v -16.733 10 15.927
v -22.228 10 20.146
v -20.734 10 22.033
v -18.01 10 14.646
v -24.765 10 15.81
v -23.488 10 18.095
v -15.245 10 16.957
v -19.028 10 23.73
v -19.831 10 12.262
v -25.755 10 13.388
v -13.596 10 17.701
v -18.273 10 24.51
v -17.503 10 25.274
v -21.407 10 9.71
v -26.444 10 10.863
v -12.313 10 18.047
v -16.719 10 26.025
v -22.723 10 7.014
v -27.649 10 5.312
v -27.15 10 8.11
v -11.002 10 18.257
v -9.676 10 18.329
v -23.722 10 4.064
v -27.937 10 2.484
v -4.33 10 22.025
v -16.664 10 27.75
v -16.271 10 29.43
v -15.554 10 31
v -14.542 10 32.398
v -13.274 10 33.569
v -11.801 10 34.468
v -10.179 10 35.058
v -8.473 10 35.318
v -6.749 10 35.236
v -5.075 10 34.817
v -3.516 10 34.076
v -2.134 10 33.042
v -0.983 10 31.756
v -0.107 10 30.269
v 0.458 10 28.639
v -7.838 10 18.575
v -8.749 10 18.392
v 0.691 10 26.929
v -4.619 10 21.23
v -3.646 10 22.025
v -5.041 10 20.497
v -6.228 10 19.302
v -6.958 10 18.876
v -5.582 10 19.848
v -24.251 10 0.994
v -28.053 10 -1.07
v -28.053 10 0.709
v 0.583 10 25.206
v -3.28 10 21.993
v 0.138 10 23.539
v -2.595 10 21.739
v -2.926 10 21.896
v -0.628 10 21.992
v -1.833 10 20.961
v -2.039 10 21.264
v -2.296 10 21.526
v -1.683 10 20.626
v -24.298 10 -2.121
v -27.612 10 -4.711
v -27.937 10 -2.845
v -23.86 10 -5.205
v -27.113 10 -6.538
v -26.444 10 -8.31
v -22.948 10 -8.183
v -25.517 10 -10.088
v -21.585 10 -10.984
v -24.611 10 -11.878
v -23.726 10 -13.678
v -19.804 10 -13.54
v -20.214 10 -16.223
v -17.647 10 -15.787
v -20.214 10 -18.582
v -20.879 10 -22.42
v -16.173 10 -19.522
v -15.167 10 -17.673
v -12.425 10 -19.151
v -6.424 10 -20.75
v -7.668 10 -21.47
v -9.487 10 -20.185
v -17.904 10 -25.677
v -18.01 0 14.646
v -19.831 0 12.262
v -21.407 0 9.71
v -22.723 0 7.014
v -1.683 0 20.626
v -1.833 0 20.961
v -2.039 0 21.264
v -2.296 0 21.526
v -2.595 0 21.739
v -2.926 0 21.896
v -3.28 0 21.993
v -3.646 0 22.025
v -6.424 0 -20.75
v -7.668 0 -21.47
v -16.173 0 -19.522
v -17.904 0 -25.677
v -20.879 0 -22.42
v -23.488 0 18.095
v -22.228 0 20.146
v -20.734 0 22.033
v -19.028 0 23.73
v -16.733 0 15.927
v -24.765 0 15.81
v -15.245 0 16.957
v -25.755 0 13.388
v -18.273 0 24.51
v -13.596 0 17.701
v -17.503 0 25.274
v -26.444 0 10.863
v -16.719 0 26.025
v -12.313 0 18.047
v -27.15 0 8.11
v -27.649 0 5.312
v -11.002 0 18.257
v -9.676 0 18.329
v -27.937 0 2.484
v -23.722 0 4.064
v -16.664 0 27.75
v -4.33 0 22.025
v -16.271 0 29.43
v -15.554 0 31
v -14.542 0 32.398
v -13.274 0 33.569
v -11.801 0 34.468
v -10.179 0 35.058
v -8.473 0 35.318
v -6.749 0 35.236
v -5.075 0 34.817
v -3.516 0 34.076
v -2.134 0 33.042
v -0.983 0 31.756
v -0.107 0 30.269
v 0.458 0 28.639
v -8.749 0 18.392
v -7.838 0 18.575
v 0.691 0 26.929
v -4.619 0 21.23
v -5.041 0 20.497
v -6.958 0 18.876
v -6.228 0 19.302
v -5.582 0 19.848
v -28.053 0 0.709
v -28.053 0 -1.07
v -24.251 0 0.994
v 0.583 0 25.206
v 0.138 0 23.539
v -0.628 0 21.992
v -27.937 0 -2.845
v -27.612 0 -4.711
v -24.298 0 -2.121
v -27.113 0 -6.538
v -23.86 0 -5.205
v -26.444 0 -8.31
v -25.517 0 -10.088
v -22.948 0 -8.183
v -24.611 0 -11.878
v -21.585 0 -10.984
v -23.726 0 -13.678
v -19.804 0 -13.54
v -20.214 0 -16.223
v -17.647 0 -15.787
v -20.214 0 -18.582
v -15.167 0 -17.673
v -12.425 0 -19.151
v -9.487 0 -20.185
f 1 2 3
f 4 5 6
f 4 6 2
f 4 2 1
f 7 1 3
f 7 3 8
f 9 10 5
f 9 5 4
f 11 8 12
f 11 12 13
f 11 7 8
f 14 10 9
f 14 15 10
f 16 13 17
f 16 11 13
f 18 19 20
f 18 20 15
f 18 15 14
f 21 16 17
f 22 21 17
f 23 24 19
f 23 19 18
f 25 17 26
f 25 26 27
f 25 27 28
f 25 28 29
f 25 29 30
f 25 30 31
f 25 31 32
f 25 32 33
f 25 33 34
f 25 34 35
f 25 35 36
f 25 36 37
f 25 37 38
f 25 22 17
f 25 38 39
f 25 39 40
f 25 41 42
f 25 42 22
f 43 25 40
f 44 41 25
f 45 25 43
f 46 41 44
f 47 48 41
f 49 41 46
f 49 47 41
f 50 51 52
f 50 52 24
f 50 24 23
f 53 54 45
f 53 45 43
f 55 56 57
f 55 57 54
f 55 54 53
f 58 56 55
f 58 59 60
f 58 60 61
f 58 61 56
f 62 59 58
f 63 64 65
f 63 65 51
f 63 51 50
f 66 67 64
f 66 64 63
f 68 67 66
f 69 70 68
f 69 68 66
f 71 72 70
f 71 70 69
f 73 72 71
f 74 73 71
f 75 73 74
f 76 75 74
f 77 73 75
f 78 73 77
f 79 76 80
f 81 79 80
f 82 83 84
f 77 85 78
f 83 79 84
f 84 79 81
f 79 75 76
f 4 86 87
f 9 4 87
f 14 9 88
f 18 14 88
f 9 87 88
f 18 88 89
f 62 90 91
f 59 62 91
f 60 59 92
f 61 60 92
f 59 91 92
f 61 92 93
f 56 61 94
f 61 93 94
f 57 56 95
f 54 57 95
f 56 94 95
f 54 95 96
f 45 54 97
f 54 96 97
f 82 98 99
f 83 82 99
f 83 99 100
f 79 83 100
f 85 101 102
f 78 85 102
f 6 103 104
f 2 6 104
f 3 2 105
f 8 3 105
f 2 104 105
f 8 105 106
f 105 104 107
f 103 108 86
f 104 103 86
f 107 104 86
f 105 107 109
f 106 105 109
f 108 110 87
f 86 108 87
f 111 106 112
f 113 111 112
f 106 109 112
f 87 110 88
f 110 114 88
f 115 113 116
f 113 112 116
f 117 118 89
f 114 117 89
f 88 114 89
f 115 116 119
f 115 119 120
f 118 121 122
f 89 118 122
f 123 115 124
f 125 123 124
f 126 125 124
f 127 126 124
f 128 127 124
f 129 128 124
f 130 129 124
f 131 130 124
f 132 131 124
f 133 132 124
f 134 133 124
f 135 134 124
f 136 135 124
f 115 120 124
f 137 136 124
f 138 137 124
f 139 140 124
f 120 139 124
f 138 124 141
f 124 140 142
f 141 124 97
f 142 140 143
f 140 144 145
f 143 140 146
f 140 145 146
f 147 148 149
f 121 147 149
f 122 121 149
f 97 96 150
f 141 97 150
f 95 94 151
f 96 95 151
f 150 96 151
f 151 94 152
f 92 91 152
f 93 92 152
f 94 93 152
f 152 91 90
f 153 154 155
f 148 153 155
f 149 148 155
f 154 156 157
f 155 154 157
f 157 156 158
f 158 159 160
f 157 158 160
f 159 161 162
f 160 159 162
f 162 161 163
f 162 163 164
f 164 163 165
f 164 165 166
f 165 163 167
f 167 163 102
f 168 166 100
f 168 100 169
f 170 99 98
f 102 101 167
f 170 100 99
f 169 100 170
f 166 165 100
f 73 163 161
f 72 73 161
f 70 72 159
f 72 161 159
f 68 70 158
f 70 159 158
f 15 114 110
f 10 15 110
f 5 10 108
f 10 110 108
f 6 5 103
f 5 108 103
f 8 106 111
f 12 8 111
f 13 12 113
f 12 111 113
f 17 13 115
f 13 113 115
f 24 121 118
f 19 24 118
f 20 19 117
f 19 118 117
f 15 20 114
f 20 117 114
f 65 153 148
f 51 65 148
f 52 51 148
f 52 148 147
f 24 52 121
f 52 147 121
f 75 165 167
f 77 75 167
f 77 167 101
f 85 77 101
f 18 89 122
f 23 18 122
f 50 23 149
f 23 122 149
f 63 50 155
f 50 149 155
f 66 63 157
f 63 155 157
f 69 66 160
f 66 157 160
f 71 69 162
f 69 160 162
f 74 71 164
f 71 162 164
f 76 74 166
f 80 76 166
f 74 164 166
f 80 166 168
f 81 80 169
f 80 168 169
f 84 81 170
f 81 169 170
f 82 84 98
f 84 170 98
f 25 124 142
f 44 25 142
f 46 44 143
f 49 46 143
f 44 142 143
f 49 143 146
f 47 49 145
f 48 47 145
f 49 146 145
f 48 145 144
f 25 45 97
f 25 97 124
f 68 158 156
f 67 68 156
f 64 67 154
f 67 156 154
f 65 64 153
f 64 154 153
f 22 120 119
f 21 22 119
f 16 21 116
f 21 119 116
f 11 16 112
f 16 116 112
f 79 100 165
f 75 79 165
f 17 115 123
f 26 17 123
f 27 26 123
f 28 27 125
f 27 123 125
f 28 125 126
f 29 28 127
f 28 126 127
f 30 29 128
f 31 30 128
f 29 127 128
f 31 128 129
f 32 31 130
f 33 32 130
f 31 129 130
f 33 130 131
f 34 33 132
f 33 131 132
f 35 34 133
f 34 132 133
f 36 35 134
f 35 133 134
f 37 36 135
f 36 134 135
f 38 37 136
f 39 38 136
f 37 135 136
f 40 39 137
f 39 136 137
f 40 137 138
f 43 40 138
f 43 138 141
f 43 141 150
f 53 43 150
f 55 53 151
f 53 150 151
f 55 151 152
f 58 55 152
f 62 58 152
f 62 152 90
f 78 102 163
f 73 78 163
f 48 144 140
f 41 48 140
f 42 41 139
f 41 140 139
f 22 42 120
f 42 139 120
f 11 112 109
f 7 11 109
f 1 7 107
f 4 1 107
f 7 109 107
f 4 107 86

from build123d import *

# Parameters (mm, degrees)
BOSS_EXTRUDE1_DEPTH = 10


with BuildPart() as part:
    # sungu kiri → Boss-Extrude1 (new body)
    with BuildSketch(Plane(origin=(0, 0, 0), x_dir=(1, 0, 0), z_dir=(0, 1, 0))):
        with BuildLine():
            Line((-20.214241335, 18.58200887), (-17.903708636, 25.676772527))
            Line((-17.903708636, 25.676772527), (-20.879327355, 22.419581076))
            Line((-20.879327355, 22.419581076), (-23.726014444, 13.678492013))
            ThreePointArc((-23.726014444, 13.678492013), (-25.061399851, 10.98195956), (-26.444409257, 8.309539974))
            ThreePointArc((-26.444409257, 8.309539974), (-27.383764934, 5.63006722), (-27.936945566, 2.845115782))
            ThreePointArc((-27.936945566, 2.845115782), (-28.068014235, 0.18049064), (-27.936945566, -2.484134502))
            ThreePointArc((-27.936945566, -2.484134502), (-27.425713247, -6.715299694), (-26.444409257, -10.862727794))
            ThreePointArc((-26.444409257, -10.862727794), (-25.296755437, -14.61403578), (-23.488374839, -18.095297119))
            ThreePointArc((-23.488374839, -18.095297119), (-21.509226875, -21.111515913), (-19.028108575, -23.730419207))
            ThreePointArc((-19.028108575, -23.730419207), (-17.889571337, -24.893820319), (-16.718896344, -26.024877014))
            ThreePointArc((-16.718896344, -26.024877014), (-5.074889233, -34.816772241), (-1.682577981, -20.626192702))
            ThreePointArc((-1.682577981, -20.626192702), (-2.440511975, -21.639521262), (-3.645798168, -22.024987085))
            Line((-3.645798168, -22.024987085), (-4.330199558, -22.024987085))
            ThreePointArc((-4.330199558, -22.024987085), (-5.29733591, -20.16091762), (-6.958490383, -18.876132224))
            ThreePointArc((-6.958490383, -18.876132224), (-8.290108773, -18.468617913), (-9.67568618, -18.329152159))
            ThreePointArc((-9.67568618, -18.329152159), (-11.660303974, -18.169286257), (-13.595617391, -17.701496911))
            ThreePointArc((-13.595617391, -17.701496911), (-16.012005666, -16.475638304), (-18.010368345, -14.645827324))
            ThreePointArc((-18.010368345, -14.645827324), (-20.650416196, -11.005311906), (-22.72256926, -7.01414831))
            ThreePointArc((-22.72256926, -7.01414831), (-21.584958488, 10.98418111), (-6.423603233, 20.74980075))
            Line((-6.423603233, 20.74980075), (-7.667855794, 21.470443038))
            Line((-7.667855794, 21.470443038), (-16.17291449, 19.521519125))
            Line((-16.17291449, 19.521519125), (-20.214241335, 16.223172594))
            Line((-20.214241335, 16.223172594), (-20.214241335, 18.58200887))
        make_face()
    extrude(amount=BOSS_EXTRUDE1_DEPTH)


solid = part.part
